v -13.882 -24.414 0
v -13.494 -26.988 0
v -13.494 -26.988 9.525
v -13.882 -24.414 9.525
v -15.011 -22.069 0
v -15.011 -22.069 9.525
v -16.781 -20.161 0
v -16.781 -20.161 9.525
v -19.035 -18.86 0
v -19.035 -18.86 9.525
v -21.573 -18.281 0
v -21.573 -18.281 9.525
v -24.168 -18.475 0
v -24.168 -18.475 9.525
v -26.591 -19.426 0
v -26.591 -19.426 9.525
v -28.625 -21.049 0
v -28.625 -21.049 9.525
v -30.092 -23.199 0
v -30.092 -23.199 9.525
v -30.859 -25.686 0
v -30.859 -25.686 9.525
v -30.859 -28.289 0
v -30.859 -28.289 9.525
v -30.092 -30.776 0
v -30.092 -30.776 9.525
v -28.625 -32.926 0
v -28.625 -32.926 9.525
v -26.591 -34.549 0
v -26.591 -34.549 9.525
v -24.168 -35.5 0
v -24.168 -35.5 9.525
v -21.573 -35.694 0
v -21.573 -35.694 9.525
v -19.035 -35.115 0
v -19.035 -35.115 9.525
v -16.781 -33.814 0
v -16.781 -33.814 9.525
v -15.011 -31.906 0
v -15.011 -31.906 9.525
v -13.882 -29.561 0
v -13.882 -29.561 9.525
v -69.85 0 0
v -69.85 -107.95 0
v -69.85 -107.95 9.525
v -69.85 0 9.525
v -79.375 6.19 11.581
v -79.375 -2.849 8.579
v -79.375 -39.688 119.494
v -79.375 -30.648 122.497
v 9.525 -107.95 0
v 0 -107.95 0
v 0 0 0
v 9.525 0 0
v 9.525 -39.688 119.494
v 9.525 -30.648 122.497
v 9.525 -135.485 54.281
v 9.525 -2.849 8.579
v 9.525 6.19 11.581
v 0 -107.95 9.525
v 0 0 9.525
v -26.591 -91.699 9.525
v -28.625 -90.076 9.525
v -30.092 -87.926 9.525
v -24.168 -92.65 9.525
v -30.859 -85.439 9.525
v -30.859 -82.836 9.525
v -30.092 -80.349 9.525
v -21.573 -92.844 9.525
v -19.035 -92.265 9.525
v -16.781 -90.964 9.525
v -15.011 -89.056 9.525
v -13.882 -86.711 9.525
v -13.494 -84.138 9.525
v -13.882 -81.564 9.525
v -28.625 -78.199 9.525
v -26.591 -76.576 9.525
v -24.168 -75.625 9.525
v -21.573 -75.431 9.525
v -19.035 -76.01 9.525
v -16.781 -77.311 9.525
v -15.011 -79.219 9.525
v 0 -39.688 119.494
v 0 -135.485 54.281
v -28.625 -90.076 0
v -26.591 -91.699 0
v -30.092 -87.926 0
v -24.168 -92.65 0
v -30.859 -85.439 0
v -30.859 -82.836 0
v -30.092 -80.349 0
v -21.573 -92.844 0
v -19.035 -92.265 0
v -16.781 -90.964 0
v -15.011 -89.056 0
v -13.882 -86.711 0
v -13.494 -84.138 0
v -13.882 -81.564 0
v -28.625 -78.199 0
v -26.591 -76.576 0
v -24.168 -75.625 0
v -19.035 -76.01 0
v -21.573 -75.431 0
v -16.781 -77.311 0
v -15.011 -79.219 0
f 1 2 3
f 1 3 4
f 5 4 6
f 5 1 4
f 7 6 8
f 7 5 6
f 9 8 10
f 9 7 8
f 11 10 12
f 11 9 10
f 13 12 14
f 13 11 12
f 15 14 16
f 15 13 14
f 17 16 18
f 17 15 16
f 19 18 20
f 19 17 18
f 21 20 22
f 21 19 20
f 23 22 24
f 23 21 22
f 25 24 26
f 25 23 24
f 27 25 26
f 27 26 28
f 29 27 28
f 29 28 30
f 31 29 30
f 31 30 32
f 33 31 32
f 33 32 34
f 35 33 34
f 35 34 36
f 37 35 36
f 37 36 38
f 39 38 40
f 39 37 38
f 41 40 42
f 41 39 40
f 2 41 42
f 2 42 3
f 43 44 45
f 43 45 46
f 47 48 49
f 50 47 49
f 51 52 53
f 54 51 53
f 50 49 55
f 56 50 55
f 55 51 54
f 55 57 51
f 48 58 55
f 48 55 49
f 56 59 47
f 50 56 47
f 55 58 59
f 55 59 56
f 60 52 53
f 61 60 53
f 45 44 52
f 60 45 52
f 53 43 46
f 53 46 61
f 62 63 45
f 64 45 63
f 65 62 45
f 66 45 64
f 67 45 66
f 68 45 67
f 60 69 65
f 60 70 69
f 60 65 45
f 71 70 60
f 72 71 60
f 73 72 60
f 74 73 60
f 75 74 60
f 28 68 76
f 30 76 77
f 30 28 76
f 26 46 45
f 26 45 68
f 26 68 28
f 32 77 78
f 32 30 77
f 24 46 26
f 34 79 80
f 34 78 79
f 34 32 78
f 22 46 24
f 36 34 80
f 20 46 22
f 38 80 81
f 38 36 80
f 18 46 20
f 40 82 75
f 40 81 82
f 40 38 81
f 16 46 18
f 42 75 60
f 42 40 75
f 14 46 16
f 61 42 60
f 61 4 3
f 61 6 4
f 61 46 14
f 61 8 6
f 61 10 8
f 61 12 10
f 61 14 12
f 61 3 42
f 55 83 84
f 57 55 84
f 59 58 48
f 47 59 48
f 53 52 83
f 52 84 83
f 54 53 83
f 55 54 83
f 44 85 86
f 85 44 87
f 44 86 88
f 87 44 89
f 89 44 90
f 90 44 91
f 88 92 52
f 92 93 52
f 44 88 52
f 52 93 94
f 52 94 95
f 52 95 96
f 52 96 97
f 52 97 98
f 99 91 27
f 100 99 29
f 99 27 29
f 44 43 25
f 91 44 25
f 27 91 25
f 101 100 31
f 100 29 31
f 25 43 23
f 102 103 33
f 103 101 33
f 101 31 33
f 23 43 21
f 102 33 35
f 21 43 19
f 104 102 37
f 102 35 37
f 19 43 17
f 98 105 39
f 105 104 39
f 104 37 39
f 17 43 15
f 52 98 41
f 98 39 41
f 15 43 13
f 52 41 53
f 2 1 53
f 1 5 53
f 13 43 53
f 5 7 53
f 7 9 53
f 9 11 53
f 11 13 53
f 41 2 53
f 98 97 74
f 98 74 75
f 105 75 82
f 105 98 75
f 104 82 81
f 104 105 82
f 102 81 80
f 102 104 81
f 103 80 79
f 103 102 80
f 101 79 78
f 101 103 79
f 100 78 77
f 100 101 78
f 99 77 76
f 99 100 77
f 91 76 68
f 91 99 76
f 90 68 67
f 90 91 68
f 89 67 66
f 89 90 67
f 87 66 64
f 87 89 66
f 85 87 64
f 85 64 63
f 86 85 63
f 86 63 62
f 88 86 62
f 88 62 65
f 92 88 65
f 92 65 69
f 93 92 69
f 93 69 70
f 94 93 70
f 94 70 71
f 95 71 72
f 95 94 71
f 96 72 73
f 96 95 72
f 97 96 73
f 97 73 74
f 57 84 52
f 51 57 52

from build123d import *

# Parameters (mm, degrees)
F1_DEPTH = 9.525
F2_W     = 69.85
F2_H     = 107.95
F2_R     = 8.73125
F3_DEPTH = 9.525
F4_W     = 9.525
F4_H     = 116.87314
F5_DEPTH = 9.525


with BuildPart() as f1:
    # F0 (on Right) → F1 (new body)
    with BuildSketch(Plane.YZ):
        Polygon((-107.95, 0), (0, 0), (-39.6875, 119.4943), (-135.484783, 54.280857), align=None)
    extrude(amount=F1_DEPTH)


with BuildPart() as f3:
    # F2 (on Top) → F3 (new body)
    with BuildSketch(Plane.XY):
        with Locations((-34.925, -53.975)):
            Rectangle(F2_W, F2_H)
        with Locations((-22.225, -84.1375)):
            Circle(F2_R, mode=Mode.SUBTRACT)
        with Locations((-22.225, -26.9875)):
            Circle(F2_R, mode=Mode.SUBTRACT)
    extrude(amount=F3_DEPTH)


with BuildPart() as f5:
    # F4 (on face) → F5 (new body)
    with BuildSketch(Plane(origin=(0, 0, 0), x_dir=(-1, 0, 0), z_dir=(0, 0.949026, 0.315199))):
        with Locations((-4.7625, 67.47604)):
            Rectangle(F4_W, F4_H)
        Polygon((79.375, 125.91261), (0, 125.91261), (0, 9.03947), (69.85, 9.03947), (79.375, 9.03947), align=None)
    extrude(amount=F5_DEPTH)


solid = Compound([f1.part, f3.part, f5.part])
